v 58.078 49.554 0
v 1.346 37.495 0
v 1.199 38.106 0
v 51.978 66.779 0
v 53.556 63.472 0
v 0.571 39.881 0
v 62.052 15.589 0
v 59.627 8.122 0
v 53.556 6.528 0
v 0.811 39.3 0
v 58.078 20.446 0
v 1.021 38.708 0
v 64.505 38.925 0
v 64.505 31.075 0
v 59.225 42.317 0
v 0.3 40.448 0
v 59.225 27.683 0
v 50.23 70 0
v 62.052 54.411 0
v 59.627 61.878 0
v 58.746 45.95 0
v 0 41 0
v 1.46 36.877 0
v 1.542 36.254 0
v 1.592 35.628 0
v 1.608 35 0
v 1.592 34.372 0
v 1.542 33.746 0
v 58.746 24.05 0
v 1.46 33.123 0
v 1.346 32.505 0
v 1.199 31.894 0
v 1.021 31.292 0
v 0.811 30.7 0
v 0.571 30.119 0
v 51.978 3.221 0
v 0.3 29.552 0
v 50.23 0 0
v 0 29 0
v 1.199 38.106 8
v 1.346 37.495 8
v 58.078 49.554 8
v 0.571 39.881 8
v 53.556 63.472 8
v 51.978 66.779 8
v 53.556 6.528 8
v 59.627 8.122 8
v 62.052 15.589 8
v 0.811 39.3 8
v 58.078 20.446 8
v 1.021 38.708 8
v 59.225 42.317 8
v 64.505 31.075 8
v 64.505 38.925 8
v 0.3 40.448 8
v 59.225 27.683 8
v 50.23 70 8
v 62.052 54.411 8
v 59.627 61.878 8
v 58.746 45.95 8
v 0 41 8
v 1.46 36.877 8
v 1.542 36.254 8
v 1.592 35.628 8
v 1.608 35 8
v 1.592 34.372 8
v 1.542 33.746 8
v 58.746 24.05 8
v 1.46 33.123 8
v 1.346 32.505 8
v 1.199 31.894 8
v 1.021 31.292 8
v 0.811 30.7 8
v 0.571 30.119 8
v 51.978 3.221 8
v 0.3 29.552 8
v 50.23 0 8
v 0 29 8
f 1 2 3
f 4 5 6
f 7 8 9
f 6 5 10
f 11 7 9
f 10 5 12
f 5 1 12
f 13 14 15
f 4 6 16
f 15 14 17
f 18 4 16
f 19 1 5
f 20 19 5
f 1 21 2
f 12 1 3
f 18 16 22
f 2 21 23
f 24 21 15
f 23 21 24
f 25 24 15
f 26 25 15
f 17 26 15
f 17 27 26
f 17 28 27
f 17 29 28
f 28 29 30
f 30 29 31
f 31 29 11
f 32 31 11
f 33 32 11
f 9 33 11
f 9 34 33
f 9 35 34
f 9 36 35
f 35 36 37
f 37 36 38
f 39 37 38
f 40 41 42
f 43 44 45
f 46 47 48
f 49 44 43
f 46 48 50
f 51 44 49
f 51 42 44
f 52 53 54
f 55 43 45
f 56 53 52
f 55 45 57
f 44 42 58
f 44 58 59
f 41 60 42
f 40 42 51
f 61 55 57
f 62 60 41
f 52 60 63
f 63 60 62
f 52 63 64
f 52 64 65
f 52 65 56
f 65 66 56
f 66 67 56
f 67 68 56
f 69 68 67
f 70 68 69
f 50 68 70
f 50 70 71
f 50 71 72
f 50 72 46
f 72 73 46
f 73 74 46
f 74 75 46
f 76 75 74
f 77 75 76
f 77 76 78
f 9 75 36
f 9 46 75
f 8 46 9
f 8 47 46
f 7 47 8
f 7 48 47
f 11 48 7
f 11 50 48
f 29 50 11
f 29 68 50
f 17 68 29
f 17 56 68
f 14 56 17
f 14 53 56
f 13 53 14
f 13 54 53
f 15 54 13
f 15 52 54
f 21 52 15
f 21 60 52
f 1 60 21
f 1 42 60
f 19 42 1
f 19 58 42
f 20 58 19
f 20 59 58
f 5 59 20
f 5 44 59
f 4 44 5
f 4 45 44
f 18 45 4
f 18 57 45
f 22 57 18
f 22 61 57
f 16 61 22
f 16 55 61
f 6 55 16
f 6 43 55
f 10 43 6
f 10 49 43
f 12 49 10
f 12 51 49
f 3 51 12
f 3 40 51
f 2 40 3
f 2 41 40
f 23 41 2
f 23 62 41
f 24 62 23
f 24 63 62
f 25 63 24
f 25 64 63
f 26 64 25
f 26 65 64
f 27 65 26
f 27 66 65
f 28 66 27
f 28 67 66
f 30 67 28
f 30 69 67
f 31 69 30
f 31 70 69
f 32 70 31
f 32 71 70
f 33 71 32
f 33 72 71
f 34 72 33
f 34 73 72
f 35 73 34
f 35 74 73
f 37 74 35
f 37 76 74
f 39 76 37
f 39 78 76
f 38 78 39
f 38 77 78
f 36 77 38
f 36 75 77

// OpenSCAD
$fn = 32;

// ----------------------------------------------------------------------
// Gear sector: 3 teeth on 60 degrees
// ----------------------------------------------------------------------

// --- parameters (mm) ---
sector_angle = 60;        // sector angle, degrees
root_r = 70;              // root circle radius
tooth_h = 5;              // tooth height over the root circle
teeth = 3;                // number of teeth on the sector
hub_r = 12;               // hub bore radius
plate_t = 8;              // sector thickness, Z
arc_step = 3;             // sampling step of the root/hub arcs, degrees
fit_tol = 0.05;           // declared fit tolerance (prompt contract)
free_tol = 0.2;           // declared free tolerance (prompt contract)

tip_r = root_r + tooth_h;  // tip circle radius

profile = [[50.23, 0], [51.978, 3.221], [53.556, 6.528], [59.627, 8.122], [62.052, 15.589], [58.078, 20.446], [58.746, 24.05], [59.225, 27.683], [64.505, 31.075], [64.505, 38.925], [59.225, 42.317], [58.746, 45.95], [58.078, 49.554], [62.052, 54.411], [59.627, 61.878], [53.556, 63.472], [51.978, 66.779], [50.23, 70], [0, 41], [0.3, 40.448], [0.571, 39.881], [0.811, 39.3], [1.021, 38.708], [1.199, 38.106], [1.346, 37.495], [1.46, 36.877], [1.542, 36.254], [1.592, 35.628], [1.608, 35], [1.592, 34.372], [1.542, 33.746], [1.46, 33.123], [1.346, 32.505], [1.199, 31.894], [1.021, 31.292], [0.811, 30.7], [0.571, 30.119], [0.3, 29.552], [0, 29]];  // primary outline, 39 points, counter clockwise

// --- the one profile operation ---
linear_extrude(height = plate_t) polygon(points = profile);
